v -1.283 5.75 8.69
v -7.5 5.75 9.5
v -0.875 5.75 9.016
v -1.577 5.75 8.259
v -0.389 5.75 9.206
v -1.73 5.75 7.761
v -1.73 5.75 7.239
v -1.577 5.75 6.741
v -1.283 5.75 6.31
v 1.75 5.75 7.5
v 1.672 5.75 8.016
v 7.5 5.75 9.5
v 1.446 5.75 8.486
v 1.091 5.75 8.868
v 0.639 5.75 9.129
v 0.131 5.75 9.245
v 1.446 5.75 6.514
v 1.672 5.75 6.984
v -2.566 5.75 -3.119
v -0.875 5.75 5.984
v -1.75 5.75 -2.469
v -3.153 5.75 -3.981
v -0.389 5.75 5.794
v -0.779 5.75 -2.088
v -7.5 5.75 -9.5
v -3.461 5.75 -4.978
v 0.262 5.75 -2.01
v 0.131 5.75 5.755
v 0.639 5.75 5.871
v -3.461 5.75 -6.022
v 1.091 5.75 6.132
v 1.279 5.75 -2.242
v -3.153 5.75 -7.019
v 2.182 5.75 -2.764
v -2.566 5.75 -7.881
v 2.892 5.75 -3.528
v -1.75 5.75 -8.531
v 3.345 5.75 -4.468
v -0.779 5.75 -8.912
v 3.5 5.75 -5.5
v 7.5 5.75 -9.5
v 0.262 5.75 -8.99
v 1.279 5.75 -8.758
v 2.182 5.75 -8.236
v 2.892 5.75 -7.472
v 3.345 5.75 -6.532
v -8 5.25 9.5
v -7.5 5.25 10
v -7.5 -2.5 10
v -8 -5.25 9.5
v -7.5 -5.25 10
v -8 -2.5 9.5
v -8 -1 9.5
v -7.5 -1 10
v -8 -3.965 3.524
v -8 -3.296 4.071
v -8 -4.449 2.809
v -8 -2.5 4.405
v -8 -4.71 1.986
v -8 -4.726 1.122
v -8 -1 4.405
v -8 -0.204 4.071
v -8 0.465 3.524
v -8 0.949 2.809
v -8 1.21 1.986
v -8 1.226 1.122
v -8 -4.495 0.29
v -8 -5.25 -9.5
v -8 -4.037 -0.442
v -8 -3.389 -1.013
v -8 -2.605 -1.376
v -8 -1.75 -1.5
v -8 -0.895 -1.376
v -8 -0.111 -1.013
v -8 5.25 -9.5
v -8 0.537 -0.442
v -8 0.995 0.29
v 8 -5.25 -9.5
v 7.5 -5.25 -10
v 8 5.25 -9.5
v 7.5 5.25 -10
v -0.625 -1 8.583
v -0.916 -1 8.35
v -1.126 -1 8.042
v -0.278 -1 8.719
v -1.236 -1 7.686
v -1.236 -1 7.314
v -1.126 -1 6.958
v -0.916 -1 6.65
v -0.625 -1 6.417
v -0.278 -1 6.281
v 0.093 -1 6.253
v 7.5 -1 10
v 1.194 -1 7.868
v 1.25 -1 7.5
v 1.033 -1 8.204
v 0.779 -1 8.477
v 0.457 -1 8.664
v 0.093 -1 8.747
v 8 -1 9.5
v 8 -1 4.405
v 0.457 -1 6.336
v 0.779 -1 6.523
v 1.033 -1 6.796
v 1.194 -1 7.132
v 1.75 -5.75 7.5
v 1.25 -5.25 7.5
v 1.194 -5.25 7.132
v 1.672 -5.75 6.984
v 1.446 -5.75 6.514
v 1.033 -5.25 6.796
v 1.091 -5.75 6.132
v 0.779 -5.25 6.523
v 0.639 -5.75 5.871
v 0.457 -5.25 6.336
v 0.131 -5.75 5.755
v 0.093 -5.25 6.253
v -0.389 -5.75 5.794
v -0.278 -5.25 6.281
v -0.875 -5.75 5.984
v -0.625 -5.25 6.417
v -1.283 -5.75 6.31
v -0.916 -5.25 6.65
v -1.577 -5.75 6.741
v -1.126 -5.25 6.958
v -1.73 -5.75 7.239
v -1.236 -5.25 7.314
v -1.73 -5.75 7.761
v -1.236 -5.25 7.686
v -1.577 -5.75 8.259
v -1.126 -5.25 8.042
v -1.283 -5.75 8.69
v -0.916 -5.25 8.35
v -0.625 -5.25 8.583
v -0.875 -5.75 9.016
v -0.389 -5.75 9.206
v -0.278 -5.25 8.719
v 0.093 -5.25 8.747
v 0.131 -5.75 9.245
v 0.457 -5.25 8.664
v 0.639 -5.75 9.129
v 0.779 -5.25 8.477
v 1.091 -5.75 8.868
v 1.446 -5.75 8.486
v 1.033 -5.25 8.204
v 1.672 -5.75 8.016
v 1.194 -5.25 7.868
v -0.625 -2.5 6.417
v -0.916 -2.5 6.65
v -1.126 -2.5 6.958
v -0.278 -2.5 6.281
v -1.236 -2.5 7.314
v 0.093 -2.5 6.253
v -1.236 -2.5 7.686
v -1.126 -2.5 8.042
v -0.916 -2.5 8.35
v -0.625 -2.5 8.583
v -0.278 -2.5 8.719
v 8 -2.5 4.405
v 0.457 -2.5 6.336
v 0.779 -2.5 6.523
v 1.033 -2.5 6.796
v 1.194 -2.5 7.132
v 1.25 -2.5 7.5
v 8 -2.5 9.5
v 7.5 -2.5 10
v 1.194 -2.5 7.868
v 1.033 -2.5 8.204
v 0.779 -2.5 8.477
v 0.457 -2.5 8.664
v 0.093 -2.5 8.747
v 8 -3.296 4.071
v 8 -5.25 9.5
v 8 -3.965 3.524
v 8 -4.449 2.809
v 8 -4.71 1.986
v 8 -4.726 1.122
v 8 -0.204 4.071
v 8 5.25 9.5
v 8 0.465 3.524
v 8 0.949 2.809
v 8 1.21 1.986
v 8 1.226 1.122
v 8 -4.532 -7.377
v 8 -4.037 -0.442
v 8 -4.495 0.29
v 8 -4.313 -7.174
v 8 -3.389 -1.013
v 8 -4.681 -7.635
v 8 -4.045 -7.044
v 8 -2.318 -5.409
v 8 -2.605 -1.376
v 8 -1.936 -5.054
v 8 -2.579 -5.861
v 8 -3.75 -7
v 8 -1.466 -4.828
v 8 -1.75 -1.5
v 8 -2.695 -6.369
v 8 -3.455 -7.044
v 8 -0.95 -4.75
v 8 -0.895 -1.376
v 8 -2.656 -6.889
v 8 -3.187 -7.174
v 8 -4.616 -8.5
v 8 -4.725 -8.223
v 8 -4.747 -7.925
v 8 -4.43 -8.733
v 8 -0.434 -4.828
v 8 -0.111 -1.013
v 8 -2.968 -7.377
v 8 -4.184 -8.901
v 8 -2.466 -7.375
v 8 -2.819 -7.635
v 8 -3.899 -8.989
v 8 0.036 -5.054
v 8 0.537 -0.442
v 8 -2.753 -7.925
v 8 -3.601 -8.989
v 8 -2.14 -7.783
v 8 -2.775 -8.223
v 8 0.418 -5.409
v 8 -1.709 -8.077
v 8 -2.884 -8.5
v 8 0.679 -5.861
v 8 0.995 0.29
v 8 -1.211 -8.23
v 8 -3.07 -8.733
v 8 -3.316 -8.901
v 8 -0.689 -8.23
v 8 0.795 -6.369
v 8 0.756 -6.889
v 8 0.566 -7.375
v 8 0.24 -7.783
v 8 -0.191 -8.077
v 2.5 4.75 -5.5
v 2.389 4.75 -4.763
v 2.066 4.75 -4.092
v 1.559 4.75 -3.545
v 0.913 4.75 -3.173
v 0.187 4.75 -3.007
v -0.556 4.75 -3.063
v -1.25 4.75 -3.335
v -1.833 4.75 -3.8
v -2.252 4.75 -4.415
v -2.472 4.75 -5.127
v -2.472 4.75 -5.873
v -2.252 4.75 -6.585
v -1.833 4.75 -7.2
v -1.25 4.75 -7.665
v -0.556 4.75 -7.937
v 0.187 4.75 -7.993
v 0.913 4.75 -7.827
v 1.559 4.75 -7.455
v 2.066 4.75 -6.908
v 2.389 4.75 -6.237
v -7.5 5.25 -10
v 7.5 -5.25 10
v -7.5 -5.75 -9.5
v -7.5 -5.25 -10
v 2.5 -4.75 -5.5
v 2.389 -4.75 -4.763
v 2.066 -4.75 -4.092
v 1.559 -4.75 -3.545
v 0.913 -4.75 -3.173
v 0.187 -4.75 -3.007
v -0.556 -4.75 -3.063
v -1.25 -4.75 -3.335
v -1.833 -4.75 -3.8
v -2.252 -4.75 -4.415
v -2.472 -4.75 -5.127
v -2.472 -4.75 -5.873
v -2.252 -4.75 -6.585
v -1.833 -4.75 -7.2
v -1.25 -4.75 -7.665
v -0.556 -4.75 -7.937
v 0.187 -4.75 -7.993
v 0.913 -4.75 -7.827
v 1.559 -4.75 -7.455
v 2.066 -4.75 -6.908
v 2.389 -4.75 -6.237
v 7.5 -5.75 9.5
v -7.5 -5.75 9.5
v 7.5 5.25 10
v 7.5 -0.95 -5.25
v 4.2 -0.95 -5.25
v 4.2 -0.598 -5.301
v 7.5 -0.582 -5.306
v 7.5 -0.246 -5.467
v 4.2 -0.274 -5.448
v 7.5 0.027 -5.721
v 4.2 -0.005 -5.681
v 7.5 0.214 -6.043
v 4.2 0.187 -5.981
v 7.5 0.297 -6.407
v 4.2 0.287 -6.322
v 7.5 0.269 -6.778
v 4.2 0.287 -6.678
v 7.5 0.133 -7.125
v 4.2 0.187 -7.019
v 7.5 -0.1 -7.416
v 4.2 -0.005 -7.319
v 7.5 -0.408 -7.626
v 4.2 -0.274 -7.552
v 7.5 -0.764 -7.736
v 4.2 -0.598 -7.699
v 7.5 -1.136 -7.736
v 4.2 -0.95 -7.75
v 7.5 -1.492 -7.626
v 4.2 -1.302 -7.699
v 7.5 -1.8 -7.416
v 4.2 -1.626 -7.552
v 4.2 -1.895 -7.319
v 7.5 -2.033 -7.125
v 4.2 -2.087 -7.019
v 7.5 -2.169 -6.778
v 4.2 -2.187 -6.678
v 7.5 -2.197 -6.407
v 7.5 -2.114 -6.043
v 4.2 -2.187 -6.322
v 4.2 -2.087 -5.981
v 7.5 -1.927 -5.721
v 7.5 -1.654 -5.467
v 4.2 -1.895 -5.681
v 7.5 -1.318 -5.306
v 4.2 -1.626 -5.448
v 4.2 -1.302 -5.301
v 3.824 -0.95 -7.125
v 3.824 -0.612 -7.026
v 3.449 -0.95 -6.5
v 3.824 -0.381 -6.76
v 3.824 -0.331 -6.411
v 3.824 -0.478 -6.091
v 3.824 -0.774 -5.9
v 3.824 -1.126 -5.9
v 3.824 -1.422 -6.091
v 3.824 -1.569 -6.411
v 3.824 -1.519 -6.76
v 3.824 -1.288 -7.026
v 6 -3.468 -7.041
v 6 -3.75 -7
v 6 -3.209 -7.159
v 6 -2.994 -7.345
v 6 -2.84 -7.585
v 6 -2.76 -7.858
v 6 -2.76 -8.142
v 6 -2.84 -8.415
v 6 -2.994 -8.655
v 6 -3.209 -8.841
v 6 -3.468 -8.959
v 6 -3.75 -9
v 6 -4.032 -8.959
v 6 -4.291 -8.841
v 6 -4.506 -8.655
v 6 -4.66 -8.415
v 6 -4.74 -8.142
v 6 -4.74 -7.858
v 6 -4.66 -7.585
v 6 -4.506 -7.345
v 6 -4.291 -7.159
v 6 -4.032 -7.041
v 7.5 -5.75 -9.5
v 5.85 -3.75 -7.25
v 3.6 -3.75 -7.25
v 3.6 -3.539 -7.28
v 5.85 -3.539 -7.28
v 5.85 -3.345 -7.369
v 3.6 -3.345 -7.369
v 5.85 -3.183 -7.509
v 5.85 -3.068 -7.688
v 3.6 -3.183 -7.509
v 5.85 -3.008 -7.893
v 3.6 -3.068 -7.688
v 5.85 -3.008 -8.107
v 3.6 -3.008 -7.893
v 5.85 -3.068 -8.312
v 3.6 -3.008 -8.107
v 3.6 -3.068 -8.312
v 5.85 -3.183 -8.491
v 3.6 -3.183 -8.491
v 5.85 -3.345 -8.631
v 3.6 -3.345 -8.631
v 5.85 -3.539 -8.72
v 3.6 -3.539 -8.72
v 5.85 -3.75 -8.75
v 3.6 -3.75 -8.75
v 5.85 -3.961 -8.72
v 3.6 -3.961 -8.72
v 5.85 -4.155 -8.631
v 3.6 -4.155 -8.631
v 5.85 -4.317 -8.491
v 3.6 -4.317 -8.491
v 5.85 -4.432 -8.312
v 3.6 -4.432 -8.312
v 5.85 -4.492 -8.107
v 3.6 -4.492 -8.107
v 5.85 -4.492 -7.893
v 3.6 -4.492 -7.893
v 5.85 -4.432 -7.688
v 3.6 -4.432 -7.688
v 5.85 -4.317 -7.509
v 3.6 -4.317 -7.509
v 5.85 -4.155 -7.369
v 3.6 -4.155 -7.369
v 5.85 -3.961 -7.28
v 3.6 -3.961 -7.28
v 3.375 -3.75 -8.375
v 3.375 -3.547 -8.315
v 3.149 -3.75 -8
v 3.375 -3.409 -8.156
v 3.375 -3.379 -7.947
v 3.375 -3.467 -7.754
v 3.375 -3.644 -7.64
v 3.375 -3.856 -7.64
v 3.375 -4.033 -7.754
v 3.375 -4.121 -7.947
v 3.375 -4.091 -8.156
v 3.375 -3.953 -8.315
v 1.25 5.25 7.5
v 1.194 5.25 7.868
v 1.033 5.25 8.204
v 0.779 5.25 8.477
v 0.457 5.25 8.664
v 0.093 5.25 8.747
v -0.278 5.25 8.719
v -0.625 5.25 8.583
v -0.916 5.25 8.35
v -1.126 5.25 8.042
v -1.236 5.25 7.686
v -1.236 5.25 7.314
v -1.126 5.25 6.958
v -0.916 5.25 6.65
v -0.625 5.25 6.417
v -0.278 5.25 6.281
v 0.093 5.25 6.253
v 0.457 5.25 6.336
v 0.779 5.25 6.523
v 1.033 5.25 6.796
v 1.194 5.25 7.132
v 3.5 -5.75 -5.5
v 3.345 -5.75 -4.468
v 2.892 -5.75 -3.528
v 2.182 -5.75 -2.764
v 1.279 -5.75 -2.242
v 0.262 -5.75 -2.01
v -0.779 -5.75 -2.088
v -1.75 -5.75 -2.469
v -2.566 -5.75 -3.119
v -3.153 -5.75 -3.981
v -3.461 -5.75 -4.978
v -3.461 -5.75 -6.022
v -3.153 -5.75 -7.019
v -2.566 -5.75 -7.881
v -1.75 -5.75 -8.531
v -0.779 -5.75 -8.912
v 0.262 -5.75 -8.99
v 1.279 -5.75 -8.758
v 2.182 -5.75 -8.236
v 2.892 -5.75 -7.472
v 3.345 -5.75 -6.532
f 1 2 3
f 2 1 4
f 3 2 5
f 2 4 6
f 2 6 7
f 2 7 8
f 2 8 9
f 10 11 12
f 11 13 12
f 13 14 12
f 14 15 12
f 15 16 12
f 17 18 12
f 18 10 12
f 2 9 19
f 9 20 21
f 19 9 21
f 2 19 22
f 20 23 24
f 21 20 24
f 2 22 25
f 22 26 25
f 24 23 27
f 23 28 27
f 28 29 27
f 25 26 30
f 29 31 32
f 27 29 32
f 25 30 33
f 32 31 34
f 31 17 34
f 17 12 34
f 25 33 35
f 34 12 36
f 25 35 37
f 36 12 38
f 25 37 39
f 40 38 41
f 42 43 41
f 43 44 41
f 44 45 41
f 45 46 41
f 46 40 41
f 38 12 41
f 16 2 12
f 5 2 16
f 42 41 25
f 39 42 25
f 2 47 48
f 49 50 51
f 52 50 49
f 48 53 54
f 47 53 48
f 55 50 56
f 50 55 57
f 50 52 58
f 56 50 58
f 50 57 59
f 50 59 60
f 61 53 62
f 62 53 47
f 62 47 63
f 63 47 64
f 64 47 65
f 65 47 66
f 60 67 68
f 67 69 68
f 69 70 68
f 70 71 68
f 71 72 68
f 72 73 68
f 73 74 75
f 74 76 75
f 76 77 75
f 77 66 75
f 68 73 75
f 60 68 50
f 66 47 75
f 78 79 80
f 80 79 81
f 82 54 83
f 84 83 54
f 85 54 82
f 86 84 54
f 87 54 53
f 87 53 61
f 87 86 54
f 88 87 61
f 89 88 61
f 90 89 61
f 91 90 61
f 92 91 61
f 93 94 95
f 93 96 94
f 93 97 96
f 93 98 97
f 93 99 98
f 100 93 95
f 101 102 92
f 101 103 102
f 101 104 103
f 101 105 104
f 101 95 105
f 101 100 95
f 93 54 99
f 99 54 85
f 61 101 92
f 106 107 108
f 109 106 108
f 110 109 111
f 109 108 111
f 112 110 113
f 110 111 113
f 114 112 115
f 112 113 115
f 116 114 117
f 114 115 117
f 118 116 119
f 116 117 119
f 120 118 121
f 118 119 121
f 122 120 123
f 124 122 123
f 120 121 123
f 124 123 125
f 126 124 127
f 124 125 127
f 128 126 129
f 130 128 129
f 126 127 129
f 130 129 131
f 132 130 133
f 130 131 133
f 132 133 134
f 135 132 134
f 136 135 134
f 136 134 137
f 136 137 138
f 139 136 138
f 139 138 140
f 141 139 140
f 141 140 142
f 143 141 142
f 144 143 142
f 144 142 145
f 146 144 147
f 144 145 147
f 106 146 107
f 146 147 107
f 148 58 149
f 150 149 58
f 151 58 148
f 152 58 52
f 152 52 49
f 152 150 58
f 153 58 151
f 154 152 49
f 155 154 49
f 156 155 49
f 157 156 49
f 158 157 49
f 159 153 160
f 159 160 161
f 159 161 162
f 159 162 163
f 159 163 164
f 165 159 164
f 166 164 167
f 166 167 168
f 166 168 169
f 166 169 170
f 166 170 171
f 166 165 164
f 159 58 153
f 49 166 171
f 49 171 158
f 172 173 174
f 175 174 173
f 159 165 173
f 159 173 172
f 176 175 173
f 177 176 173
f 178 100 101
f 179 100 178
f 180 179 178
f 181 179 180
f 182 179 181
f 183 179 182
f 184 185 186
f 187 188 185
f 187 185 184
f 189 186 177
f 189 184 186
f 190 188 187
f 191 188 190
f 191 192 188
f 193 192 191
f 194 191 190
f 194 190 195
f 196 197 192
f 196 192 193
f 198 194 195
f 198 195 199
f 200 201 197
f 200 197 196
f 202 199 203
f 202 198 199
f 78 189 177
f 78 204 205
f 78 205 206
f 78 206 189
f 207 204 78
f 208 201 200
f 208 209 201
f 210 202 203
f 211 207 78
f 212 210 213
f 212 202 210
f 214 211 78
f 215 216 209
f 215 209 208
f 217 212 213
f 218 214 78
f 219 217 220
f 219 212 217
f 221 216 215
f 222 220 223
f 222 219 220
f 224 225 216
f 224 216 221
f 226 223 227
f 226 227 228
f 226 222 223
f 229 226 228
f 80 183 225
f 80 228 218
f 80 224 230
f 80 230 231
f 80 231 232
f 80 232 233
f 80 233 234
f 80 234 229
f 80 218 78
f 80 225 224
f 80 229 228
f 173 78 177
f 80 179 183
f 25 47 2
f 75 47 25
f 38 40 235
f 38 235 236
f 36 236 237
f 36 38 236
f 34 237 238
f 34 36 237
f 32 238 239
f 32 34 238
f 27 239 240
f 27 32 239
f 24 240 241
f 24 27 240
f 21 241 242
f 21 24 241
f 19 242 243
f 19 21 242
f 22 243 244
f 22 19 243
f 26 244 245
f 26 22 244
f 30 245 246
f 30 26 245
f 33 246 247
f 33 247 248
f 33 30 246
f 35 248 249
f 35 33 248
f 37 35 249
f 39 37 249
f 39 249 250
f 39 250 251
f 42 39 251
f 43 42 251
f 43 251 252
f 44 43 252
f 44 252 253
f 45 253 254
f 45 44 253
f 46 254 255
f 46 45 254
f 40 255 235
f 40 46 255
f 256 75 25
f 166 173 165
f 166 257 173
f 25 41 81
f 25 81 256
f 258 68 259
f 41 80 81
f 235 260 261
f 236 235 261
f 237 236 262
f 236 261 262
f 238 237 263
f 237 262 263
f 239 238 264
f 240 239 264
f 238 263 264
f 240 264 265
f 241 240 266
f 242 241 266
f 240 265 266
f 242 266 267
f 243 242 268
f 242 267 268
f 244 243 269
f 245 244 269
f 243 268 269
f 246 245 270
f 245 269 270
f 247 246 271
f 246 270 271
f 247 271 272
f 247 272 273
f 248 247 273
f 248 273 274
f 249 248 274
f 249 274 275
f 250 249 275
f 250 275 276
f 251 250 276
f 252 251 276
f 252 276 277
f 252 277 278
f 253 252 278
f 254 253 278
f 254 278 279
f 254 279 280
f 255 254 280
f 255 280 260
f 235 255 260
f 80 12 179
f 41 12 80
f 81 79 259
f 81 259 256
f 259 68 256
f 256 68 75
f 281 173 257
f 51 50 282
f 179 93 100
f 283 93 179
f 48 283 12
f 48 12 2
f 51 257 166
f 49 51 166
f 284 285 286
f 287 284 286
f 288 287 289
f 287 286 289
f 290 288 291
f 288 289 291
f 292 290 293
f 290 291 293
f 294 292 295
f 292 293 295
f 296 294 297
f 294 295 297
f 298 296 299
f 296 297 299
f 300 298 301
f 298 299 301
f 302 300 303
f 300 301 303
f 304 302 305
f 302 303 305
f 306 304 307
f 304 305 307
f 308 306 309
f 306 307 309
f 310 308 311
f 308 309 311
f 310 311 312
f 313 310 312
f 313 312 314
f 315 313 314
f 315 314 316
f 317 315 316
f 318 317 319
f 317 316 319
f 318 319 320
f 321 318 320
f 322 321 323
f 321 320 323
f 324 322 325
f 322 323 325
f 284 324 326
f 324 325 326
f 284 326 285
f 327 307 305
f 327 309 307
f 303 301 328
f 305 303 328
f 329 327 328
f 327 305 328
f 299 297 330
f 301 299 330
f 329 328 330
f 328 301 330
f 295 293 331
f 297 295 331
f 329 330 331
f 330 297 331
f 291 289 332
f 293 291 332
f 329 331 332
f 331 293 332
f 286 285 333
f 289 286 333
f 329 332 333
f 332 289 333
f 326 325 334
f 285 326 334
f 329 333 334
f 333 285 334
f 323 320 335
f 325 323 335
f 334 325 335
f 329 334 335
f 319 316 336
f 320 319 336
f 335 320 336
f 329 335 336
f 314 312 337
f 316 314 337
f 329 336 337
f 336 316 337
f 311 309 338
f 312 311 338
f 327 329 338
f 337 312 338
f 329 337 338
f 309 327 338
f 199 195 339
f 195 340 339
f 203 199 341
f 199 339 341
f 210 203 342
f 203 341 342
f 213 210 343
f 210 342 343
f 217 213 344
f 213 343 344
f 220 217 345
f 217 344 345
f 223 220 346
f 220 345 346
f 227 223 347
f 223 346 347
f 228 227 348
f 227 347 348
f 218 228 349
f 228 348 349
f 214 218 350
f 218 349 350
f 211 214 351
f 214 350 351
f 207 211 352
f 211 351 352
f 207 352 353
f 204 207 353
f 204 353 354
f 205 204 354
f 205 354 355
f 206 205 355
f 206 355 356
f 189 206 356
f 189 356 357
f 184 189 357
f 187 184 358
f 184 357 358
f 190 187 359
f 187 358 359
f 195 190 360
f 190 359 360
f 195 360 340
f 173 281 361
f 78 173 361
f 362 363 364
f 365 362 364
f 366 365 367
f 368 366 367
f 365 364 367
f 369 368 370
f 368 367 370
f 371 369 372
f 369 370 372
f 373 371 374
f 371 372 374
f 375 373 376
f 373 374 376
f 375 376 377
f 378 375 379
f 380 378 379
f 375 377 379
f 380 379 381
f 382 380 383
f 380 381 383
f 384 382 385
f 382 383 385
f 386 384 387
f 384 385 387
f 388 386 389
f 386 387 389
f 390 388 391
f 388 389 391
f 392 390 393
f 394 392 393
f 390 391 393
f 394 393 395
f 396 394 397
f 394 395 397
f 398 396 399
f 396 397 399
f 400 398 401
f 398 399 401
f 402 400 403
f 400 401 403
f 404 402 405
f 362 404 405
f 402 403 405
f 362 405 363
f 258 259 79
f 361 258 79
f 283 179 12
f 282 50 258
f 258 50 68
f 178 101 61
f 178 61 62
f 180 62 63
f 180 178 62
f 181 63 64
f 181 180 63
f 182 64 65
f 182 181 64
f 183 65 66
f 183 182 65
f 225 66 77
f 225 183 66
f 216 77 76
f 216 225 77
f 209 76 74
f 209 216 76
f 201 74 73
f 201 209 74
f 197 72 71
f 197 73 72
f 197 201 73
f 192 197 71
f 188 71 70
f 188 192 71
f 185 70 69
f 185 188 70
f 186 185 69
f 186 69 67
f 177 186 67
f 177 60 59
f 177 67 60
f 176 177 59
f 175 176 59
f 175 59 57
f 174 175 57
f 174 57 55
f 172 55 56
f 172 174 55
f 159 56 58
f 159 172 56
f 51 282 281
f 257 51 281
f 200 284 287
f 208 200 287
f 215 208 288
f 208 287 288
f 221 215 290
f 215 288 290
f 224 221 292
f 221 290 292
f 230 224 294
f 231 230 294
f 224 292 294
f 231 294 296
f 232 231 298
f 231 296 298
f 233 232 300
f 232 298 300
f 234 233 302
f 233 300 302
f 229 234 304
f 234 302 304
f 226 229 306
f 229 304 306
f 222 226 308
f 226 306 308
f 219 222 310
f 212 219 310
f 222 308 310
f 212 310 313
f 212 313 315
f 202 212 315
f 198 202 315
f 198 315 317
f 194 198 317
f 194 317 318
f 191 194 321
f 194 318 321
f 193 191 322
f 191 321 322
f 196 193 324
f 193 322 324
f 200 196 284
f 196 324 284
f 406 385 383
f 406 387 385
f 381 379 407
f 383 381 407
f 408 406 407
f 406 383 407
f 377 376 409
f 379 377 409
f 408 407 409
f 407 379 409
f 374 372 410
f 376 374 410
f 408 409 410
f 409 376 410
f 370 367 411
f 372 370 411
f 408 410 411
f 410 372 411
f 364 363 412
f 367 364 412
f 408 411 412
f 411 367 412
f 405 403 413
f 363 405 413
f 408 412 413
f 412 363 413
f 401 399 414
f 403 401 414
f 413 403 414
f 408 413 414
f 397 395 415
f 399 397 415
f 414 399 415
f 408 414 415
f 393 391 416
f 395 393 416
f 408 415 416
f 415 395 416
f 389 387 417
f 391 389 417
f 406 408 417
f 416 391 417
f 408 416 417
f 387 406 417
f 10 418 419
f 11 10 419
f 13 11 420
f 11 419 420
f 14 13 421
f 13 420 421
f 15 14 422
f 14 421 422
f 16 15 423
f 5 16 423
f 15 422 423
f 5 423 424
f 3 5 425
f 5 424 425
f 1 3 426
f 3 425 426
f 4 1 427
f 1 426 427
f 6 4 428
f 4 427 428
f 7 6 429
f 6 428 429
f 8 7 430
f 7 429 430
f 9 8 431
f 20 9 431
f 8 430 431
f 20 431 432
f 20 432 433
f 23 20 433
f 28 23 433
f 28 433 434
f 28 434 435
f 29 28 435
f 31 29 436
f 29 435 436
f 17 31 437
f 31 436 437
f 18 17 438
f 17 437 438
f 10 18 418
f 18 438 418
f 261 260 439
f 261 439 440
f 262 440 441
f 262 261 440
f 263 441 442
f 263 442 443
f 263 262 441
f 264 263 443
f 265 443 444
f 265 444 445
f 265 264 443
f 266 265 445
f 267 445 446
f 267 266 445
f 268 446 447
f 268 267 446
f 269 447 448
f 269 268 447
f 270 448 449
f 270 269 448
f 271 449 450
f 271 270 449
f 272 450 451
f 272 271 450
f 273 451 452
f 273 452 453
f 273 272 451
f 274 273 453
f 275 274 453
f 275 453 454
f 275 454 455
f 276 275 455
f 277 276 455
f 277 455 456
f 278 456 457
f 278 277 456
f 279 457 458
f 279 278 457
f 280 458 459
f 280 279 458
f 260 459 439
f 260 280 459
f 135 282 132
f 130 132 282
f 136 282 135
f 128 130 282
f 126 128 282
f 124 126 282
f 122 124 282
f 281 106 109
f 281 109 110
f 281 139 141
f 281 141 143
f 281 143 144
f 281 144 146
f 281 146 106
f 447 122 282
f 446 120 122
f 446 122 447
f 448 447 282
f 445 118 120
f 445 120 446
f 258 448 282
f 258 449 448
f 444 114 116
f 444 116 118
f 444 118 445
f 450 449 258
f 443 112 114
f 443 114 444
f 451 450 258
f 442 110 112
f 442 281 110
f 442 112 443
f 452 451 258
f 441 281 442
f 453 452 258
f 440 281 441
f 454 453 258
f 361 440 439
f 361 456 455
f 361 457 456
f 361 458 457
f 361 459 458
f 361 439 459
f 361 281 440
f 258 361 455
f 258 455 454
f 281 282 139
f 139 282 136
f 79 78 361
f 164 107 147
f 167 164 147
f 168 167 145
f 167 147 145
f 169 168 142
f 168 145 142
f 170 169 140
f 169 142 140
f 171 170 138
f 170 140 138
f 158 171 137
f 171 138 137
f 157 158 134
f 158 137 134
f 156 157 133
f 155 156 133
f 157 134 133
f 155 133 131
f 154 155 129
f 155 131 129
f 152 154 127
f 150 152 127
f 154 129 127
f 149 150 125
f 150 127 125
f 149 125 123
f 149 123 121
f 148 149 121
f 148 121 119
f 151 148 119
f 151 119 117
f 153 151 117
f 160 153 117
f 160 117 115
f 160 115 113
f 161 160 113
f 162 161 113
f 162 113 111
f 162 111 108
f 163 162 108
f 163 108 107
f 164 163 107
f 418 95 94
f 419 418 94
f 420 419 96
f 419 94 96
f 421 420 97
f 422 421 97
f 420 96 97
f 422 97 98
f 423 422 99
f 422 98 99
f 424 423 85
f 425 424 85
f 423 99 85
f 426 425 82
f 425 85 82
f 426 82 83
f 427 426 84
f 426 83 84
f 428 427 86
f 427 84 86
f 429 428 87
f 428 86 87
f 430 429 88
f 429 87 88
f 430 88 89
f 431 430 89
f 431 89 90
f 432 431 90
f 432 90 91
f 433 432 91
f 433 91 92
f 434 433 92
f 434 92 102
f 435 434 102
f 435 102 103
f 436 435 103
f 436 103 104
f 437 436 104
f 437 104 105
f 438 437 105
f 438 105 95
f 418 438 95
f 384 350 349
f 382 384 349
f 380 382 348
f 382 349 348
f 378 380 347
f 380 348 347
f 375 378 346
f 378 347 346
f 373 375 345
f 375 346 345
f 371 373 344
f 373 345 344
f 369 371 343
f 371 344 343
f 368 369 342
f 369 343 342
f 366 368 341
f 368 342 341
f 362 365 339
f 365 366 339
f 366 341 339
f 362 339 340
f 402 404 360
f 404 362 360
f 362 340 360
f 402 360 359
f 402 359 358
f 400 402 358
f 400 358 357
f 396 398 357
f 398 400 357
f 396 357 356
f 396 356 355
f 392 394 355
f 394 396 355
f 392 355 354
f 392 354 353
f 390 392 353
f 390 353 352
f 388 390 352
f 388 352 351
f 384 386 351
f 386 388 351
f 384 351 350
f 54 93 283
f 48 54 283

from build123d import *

# Parameters (mm, degrees)
SKETCH_1_W            = 20
SKETCH_1_H            = 11.5
EXTRUDE_1_DEPTH       = 8
CUT_EXTRUDE_1_REACH   = 18
HOLE_WIZARD_M31_D     = 2.5
HOLE_WIZARD_M31_DEPTH = 11.5
HOLE_WIZARD_M31_TIP   = 0.751075774
HOLE_WIZARD_M61_D     = 5
HOLE_WIZARD_M61_DEPTH = 11.5
CHAMFER_1_SIZE        = 0.5
CHAMFER_2_SIZE        = 1
HOLE_WIZARD_M32_D     = 2.5
HOLE_WIZARD_M32_DEPTH = 3.8
HOLE_WIZARD_M32_TIP   = 0.751075774
CHAMFER_3_SIZE        = 0.5
HOLE_WIZARD_1_D       = 1.5
HOLE_WIZARD_1_DEPTH   = 4.4
HOLE_WIZARD_1_TIP     = 0.450645464
HOLE_WIZARD_2_D       = 2
HOLE_WIZARD_2_DEPTH   = 2
HOLE_WIZARD_2_TIP     = 0.600860619
CHAMFER_4_SIZE        = 0.5


with BuildPart() as part:
    # Эскиз1 → Бобышка-Вытянуть1 (new body, symmetric)
    with BuildSketch(Plane(origin=(0, 0, 0), x_dir=(0, 0, -1), z_dir=(1, 0, 0))):
        Rectangle(SKETCH_1_W, SKETCH_1_H)
    extrude(amount=EXTRUDE_1_DEPTH, both=True)

    # Эскиз2 → Вырез-Вытянуть1 (cut, up to next)
    with BuildSketch(Plane(origin=(8, 0, 0), x_dir=(0, 0, -1), z_dir=(1, 0, 0)), mode=Mode.PRIVATE) as cut_extrude_1_sk1:
        with BuildLine():
            Line((-10, -1), (-4.40473751, -1))
            ThreePointArc((-4.40473751, -1), (1.5, -1.75), (-4.40473751, -2.5))
            Line((-4.40473751, -2.5), (-10, -2.5))
            Line((-10, -2.5), (-10, -1))
        make_face()
    cut_extrude_1_tool1 = extrude(cut_extrude_1_sk1.sketch, amount=-CUT_EXTRUDE_1_REACH, mode=Mode.PRIVATE) & part.part
    add(cut_extrude_1_tool1.solids().sort_by_distance((8, -1.75, 2.800956))[0], mode=Mode.SUBTRACT)

    # Отверстие обработанное метчиком M31
    with Locations(Plane(origin=(0, 5.75, 0), x_dir=(-1, 0, 0), z_dir=(0, 1, 0))):
        with Locations((0, 7.5)):
            Hole(HOLE_WIZARD_M31_D / 2, depth=HOLE_WIZARD_M31_DEPTH)
            with Locations((0, 0, -(HOLE_WIZARD_M31_DEPTH + HOLE_WIZARD_M31_TIP / 2))):  # 118° drill point
                Cone(0, HOLE_WIZARD_M31_D / 2, HOLE_WIZARD_M31_TIP, mode=Mode.SUBTRACT)

    # Отверстие обработанное метчиком M61
    with Locations(Plane(origin=(0, 5.75, 0), x_dir=(-1, 0, 0), z_dir=(0, 1, 0))):
        with Locations((0, -5.5)):
            Hole(HOLE_WIZARD_M61_D / 2, depth=HOLE_WIZARD_M61_DEPTH)

    # Фаска1
    chamfer_1_edges = [part.edges().sort_by_distance(p)[0] for p in [
        (-1.25, 5.75, 7.5),
        (-1.25, -5.75, 7.5),
    ]]
    chamfer(chamfer_1_edges, length=CHAMFER_1_SIZE)

    # Фаска2
    chamfer_2_edges = [part.edges().sort_by_distance(p)[0] for p in [
        (-2.5, 5.75, -5.5),
        (-2.5, -5.75, -5.5),
    ]]
    chamfer(chamfer_2_edges, length=CHAMFER_2_SIZE)

    # Отверстие обработанное метчиком M32
    with Locations(Plane(origin=(8, 0, 0), x_dir=(0, 0, -1), z_dir=(1, 0, 0))):
        with Locations((6.5, -0.95)):
            Hole(HOLE_WIZARD_M32_D / 2, depth=HOLE_WIZARD_M32_DEPTH)
            with Locations((0, 0, -(HOLE_WIZARD_M32_DEPTH + HOLE_WIZARD_M32_TIP / 2))):  # 118° drill point
                Cone(0, HOLE_WIZARD_M32_D / 2, HOLE_WIZARD_M32_TIP, mode=Mode.SUBTRACT)

    # Фаска3
    chamfer_3_edges = [part.edges().sort_by_distance(p)[0] for p in [
        (8, -0.95, -7.75),
    ]]
    chamfer(chamfer_3_edges, length=CHAMFER_3_SIZE)

    # Отверстие1
    with Locations(Plane(origin=(8, 0, 0), x_dir=(0, 0, -1), z_dir=(1, 0, 0))):
        with Locations((8, -3.75)):
            Hole(HOLE_WIZARD_1_D / 2, depth=HOLE_WIZARD_1_DEPTH)
            with Locations((0, 0, -(HOLE_WIZARD_1_DEPTH + HOLE_WIZARD_1_TIP / 2))):  # 118° drill point
                Cone(0, HOLE_WIZARD_1_D / 2, HOLE_WIZARD_1_TIP, mode=Mode.SUBTRACT)

    # Отверстие2
    with Locations(Plane(origin=(8, 0, 0), x_dir=(0, 0, -1), z_dir=(1, 0, 0))):
        with Locations((8, -3.75)):
            Hole(HOLE_WIZARD_2_D / 2, depth=HOLE_WIZARD_2_DEPTH)
            with Locations((0, 0, -(HOLE_WIZARD_2_DEPTH + HOLE_WIZARD_2_TIP / 2))):  # 118° drill point
                Cone(0, HOLE_WIZARD_2_D / 2, HOLE_WIZARD_2_TIP, mode=Mode.SUBTRACT)

    # Фаска4
    chamfer_4_edges = [part.edges().sort_by_distance(p)[0] for p in [
        (8, 0, -10),
        (8, 5.75, 0),
        (-8, -4.125, 10),
        (8, -4.125, 10),
        (8, 2.375, 10),
        (-8, 5.75, 0),
        (-8, 0, -10),
        (-8, -5.75, 0),
        (-8, 2.375, 10),
        (8, -5.75, 0),
        (0, 5.75, 10),
        (0, 5.75, -10),
        (0, -5.75, -10),
        (0, -5.75, 10),
    ]]
    chamfer(chamfer_4_edges, length=CHAMFER_4_SIZE)


solid = part.part
